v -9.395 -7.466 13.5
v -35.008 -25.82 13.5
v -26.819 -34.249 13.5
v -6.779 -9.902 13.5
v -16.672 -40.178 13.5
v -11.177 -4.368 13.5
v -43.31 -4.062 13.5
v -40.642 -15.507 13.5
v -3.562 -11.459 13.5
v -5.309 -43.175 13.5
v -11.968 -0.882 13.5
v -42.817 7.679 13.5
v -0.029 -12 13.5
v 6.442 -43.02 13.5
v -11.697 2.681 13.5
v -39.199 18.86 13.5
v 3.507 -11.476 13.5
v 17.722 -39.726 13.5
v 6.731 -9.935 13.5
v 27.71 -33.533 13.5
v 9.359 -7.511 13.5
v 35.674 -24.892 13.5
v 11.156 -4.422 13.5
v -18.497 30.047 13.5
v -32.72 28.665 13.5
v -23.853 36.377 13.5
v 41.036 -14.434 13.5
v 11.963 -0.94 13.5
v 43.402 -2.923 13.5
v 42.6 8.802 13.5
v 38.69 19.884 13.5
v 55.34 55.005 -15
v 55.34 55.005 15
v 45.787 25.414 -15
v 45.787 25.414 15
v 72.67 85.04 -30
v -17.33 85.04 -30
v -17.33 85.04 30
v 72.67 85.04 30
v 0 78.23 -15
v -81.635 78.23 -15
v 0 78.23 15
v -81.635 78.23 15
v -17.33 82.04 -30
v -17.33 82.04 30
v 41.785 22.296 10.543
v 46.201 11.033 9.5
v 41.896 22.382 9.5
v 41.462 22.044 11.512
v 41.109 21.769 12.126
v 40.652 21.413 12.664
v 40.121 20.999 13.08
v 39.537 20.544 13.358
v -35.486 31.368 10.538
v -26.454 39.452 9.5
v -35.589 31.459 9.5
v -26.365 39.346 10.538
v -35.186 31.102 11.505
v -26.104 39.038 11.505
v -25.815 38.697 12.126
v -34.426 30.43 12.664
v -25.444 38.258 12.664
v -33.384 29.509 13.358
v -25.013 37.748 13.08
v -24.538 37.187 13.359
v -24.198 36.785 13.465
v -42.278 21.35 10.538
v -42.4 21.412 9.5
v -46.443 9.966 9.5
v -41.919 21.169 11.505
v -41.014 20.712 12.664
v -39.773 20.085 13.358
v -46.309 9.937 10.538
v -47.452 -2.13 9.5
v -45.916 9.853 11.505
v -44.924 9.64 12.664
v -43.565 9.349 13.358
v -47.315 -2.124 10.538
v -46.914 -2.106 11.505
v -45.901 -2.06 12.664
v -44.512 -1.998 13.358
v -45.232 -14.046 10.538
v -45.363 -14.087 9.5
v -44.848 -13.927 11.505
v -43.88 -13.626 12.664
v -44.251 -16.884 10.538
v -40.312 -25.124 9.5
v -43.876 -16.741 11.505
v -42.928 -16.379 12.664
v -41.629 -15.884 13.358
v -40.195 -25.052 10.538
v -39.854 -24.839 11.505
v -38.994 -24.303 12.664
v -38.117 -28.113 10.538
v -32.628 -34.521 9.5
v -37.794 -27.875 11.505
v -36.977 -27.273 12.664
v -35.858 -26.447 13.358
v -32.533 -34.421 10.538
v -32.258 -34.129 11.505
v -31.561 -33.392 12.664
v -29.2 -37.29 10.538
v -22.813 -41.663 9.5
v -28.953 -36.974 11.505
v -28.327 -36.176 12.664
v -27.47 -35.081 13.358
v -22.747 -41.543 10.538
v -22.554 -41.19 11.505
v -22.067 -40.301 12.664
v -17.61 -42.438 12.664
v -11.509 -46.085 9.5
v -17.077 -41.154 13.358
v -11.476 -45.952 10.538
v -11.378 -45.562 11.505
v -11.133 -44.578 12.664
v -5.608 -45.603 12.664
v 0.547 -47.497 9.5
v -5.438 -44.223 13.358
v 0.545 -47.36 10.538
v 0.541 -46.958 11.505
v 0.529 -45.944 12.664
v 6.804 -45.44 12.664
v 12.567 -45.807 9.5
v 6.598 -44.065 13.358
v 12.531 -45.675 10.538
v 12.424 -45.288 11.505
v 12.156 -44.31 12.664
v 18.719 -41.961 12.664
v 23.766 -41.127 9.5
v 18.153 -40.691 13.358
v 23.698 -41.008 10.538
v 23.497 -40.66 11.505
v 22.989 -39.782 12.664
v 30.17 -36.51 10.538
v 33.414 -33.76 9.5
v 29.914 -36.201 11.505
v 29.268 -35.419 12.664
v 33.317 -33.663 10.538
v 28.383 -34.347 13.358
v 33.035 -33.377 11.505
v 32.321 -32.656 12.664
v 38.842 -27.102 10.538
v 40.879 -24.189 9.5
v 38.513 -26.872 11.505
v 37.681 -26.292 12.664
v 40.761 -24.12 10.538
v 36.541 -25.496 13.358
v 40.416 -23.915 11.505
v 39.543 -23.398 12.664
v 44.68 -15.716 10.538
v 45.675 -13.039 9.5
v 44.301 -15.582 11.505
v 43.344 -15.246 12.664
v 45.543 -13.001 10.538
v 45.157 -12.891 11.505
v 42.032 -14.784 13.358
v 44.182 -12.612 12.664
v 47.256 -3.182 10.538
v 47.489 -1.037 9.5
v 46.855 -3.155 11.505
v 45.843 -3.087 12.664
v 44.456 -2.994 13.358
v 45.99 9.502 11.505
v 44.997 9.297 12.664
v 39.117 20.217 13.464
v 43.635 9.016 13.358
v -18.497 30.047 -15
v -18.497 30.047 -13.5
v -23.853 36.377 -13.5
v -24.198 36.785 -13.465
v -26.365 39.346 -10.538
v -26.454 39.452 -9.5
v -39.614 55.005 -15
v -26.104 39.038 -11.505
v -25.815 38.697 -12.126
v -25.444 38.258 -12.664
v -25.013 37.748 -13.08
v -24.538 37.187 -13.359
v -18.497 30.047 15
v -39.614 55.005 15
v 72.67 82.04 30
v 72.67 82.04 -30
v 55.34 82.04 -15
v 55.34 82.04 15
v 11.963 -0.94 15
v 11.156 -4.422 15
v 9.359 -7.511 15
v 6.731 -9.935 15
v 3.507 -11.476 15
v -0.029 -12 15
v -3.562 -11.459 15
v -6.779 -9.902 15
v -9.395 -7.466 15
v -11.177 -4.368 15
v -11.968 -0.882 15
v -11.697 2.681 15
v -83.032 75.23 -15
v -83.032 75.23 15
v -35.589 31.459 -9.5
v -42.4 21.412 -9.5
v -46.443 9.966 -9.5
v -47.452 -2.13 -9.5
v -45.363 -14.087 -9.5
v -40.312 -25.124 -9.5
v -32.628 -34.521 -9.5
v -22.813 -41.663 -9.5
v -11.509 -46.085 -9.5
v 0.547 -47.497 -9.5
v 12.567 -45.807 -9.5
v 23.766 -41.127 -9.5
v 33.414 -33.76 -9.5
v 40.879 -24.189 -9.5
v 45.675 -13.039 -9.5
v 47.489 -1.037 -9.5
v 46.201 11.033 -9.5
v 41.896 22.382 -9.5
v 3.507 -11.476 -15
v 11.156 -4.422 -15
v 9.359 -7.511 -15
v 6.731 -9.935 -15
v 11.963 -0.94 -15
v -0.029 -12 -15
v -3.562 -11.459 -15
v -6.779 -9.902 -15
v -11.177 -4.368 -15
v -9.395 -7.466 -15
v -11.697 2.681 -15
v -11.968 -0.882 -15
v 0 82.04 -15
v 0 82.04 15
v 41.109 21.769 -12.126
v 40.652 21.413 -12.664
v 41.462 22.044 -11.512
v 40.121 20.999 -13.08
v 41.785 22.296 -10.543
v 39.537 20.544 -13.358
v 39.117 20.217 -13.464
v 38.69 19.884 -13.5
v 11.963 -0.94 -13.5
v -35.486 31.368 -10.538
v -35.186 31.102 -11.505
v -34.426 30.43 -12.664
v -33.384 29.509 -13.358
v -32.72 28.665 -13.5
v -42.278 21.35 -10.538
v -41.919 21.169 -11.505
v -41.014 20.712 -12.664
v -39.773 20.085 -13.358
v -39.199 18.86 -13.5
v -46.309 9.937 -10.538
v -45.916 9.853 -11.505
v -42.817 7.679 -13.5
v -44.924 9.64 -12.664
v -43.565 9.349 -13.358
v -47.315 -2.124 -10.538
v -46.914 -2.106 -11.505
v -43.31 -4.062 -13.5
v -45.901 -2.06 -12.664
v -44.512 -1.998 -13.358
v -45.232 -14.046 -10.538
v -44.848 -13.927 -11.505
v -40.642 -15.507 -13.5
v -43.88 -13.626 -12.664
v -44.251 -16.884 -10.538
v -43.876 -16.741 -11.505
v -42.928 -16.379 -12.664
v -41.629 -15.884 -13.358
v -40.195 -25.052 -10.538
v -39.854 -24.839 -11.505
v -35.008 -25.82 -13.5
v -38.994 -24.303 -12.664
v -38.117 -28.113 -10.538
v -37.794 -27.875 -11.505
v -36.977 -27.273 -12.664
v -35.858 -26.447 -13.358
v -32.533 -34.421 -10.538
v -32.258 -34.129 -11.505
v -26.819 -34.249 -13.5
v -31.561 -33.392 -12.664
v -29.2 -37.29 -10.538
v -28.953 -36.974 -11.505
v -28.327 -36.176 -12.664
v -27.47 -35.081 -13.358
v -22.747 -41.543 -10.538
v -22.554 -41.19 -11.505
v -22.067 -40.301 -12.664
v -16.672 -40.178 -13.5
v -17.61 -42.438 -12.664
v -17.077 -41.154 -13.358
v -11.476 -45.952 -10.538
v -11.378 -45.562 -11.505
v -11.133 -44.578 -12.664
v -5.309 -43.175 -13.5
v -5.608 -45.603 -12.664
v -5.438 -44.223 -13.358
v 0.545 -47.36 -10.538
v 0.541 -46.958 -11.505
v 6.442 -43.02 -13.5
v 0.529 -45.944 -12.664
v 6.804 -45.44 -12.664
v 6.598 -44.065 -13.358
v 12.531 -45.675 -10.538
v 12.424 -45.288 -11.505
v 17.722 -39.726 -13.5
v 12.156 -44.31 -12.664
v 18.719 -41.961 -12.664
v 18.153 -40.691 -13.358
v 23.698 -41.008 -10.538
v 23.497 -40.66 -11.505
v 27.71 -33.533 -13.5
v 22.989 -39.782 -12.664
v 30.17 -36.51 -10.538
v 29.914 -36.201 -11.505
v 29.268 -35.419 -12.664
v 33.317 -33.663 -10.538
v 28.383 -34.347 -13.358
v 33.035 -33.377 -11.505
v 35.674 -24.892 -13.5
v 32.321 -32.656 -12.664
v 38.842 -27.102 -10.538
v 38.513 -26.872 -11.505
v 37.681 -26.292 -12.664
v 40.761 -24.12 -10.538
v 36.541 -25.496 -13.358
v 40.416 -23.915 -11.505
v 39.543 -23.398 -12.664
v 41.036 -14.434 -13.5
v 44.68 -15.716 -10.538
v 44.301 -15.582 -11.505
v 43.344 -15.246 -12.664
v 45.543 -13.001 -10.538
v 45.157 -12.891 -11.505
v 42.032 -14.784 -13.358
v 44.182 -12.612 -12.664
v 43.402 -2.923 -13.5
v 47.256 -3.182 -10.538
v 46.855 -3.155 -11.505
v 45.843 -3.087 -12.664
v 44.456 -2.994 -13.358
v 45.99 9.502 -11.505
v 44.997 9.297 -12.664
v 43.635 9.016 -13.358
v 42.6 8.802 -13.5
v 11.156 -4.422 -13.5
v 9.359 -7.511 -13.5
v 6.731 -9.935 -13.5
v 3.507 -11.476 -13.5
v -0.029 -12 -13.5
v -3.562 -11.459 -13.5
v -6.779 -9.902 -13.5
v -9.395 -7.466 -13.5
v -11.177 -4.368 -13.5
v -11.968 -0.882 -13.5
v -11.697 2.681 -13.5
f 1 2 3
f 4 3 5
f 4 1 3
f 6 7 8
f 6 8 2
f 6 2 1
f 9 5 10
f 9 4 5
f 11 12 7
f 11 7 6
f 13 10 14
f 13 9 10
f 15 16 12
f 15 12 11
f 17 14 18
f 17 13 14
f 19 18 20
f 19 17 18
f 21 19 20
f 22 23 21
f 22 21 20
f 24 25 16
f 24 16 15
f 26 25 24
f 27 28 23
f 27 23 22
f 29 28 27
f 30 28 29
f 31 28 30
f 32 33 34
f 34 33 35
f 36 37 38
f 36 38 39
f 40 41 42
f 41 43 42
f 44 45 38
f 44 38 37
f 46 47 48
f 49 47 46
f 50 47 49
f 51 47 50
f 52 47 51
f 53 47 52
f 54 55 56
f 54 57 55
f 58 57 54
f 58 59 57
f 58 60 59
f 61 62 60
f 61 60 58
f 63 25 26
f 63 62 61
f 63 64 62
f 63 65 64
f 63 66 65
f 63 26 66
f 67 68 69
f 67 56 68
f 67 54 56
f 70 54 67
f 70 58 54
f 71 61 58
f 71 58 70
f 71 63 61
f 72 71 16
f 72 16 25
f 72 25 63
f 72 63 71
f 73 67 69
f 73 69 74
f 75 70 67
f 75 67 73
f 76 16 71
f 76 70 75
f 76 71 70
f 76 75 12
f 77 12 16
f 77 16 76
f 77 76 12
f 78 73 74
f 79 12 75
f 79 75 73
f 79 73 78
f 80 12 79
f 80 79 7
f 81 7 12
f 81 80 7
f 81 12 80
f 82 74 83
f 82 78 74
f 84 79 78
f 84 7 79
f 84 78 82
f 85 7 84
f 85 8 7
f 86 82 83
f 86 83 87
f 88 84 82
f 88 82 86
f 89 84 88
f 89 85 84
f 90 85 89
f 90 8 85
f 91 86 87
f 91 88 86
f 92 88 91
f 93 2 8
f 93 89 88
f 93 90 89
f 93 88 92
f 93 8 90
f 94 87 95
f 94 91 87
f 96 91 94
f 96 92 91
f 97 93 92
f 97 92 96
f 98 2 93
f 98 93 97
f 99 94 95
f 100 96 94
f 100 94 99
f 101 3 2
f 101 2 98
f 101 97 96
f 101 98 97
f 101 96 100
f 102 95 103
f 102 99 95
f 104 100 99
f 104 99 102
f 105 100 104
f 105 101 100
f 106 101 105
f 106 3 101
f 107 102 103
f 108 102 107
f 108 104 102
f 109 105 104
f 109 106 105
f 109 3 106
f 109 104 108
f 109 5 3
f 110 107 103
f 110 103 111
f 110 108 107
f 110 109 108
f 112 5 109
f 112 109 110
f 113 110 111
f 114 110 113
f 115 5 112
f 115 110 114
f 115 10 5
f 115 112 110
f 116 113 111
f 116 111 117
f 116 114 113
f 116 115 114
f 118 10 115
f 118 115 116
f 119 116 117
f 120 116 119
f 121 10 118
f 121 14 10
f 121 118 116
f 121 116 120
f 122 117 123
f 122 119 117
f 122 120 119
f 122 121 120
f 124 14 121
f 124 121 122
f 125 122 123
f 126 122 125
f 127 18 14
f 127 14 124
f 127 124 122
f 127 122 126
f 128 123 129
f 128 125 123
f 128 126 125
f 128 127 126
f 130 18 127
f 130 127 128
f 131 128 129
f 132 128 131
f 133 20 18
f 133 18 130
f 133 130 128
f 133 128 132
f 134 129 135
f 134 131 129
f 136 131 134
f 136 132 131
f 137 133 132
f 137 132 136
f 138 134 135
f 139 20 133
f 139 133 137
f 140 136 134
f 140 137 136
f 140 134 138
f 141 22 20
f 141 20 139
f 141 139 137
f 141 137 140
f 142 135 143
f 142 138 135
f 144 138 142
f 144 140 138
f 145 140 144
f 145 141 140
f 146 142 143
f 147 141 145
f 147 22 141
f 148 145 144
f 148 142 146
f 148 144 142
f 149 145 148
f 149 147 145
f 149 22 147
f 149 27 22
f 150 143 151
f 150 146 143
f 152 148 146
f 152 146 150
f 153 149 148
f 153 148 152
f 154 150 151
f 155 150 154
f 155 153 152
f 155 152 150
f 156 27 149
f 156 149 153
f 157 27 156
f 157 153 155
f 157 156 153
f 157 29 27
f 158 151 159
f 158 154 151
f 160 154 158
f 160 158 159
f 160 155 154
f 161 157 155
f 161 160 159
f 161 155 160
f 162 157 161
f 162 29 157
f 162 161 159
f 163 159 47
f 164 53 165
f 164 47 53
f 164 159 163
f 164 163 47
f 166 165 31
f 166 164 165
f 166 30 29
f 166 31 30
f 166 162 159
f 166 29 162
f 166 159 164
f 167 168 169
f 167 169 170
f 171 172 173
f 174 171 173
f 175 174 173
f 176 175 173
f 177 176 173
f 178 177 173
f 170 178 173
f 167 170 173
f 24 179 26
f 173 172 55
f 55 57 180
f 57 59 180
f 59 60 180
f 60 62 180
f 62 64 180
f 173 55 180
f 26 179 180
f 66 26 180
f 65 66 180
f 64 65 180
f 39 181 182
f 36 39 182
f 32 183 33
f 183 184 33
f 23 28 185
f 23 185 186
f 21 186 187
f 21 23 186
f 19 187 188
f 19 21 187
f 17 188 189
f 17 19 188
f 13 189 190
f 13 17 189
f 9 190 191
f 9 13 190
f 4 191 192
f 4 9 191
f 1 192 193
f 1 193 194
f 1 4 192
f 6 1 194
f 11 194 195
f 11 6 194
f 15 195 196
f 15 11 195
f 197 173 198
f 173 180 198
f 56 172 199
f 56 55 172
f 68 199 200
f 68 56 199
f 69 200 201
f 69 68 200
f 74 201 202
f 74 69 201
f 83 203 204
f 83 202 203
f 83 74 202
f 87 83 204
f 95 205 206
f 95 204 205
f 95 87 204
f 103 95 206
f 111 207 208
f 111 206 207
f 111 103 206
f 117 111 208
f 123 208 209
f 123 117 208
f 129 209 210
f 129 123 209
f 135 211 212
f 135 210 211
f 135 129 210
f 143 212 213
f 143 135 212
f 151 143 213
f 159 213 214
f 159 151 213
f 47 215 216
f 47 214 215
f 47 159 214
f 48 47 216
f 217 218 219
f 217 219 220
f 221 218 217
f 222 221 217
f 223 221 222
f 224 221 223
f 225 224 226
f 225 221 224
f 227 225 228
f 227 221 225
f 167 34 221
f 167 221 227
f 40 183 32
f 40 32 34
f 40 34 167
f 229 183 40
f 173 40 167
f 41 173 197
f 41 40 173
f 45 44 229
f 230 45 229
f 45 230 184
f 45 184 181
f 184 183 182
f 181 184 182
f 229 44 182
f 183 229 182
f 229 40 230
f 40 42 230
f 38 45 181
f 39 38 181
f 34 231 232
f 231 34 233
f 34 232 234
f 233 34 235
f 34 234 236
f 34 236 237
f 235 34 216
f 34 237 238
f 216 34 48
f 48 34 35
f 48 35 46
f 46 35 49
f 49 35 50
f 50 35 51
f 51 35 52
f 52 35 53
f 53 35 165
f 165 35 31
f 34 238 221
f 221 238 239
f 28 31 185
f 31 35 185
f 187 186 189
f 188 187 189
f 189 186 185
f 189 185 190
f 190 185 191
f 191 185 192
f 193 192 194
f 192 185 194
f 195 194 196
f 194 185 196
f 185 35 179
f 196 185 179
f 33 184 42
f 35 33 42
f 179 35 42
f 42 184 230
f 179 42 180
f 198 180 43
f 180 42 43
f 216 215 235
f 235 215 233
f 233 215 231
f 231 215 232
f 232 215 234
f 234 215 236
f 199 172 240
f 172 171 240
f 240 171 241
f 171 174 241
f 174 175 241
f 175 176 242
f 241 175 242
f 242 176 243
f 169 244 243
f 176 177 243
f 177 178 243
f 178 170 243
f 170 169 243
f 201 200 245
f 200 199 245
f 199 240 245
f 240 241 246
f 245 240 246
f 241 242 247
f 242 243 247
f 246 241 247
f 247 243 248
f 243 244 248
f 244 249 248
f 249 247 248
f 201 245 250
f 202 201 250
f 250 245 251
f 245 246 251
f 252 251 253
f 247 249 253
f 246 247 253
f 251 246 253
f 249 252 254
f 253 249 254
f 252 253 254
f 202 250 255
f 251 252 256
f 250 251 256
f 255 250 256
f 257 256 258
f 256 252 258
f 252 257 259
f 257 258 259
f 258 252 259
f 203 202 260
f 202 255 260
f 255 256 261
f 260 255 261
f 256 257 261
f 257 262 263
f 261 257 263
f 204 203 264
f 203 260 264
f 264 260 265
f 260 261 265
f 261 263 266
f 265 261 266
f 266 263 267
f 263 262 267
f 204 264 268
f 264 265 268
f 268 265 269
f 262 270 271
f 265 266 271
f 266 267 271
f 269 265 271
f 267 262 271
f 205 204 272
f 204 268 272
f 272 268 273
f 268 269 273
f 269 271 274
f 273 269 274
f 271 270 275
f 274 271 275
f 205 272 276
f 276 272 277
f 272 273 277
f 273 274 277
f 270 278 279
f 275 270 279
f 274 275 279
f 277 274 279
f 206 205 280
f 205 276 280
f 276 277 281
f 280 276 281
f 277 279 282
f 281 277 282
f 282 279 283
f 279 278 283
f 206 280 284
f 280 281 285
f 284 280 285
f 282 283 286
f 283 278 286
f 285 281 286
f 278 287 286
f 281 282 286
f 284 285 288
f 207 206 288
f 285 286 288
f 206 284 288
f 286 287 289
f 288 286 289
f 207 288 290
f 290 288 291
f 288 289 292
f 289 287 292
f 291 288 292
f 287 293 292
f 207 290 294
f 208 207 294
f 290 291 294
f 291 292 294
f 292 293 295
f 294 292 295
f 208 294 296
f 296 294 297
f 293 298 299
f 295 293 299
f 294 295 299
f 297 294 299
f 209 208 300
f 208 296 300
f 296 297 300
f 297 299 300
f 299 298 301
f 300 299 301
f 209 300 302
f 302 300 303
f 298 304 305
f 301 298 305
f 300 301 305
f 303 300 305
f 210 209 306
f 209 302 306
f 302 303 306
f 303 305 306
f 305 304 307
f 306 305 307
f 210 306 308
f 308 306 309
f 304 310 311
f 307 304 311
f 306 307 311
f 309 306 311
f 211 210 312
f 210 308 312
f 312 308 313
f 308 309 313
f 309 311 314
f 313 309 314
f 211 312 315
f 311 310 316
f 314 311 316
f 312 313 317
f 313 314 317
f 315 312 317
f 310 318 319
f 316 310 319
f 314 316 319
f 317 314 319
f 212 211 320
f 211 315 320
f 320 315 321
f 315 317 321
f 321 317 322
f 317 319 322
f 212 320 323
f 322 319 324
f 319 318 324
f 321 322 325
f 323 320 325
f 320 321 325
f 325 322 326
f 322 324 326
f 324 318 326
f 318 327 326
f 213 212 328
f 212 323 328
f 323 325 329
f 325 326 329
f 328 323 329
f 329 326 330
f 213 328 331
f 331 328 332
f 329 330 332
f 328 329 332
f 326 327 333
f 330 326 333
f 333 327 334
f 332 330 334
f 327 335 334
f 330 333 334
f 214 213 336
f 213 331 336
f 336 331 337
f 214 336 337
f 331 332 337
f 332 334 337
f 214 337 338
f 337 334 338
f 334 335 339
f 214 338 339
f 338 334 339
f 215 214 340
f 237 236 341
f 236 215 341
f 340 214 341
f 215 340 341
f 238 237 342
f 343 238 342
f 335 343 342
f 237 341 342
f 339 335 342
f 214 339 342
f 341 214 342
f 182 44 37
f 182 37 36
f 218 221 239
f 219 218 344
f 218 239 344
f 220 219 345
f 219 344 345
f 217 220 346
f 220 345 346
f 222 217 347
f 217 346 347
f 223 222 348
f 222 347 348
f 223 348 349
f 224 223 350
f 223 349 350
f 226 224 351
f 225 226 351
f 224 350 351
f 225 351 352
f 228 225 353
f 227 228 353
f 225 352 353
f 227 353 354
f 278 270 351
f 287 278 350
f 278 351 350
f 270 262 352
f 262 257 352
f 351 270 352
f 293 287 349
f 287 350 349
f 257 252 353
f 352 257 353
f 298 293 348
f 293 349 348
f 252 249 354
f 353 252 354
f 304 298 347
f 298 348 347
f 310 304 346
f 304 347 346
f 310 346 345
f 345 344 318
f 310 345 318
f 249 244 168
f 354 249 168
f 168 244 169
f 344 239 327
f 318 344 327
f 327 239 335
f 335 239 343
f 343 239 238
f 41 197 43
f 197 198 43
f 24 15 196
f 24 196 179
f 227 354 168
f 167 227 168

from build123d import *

# Parameters (mm, degrees)
SKETCH1_R                = 47.5
BOSS_EXTRUDE1_DEPTH      = 13.5
BOSS_EXTRUDE1_DEPTH_BACK = 13.5
FILLET1_R                = 4
BOSS_EXTRUDE2_DEPTH      = 15
BOSS_EXTRUDE2_DEPTH_BACK = 15
SKETCH5_W                = 90
SKETCH5_H                = 60
BOSS_EXTRUDE3_DEPTH      = 3


with BuildPart() as part:
    # Sketch1 → Boss-Extrude1 (new body, two sides)
    with BuildSketch(Plane.XY) as boss_extrude1_sk:
        Circle(SKETCH1_R)
    extrude(amount=BOSS_EXTRUDE1_DEPTH)
    extrude(boss_extrude1_sk.sketch, amount=-BOSS_EXTRUDE1_DEPTH_BACK)

    # Fillet1
    fillet1_edges = [part.edges().sort_by_distance(p)[0] for p in [
        (-47.5, 0, 13.5),
        (-47.5, 0, -13.5),
    ]]
    fillet(fillet1_edges, radius=FILLET1_R)

    # Sketch2 → Boss-Extrude2 (add, two sides)
    with BuildSketch(Plane.XY) as boss_extrude2_sk:
        with BuildLine():
            Line((-11.696785431, 2.681397647), (-18.496519497, 30.047194196))
            Line((-18.496519497, 30.047194196), (-39.614315725, 55.004751509))
            Line((-39.614315725, 55.004751509), (-83.032226589, 75.23))
            Line((-83.032226589, 75.23), (-81.634744669, 78.23))
            Line((-81.634744669, 78.23), (0, 78.23))
            Line((0, 78.23), (0, 82.04))
            Line((0, 82.04), (55.339662837, 82.04))
            Line((55.339662837, 82.04), (55.339662837, 55.004751509))
            Line((55.339662837, 55.004751509), (45.787278668, 25.414095095))
            Line((45.787278668, 25.414095095), (11.963303828, -0.940236292))
            ThreePointArc((11.963303828, -0.940236292), (-1.815713665, -11.862034676), (-11.696785431, 2.681397647))
        make_face()
    extrude(amount=BOSS_EXTRUDE2_DEPTH)
    extrude(boss_extrude2_sk.sketch, amount=-BOSS_EXTRUDE2_DEPTH_BACK)

    # Sketch5 → Boss-Extrude3 (add)
    with BuildSketch(Plane(origin=(0, 82.04, 0), x_dir=(1, 0, 0), z_dir=(0, 1, 0))):
        with Locations((27.669831419, 0)):
            Rectangle(SKETCH5_W, SKETCH5_H)
    extrude(amount=BOSS_EXTRUDE3_DEPTH)


solid = part.part
